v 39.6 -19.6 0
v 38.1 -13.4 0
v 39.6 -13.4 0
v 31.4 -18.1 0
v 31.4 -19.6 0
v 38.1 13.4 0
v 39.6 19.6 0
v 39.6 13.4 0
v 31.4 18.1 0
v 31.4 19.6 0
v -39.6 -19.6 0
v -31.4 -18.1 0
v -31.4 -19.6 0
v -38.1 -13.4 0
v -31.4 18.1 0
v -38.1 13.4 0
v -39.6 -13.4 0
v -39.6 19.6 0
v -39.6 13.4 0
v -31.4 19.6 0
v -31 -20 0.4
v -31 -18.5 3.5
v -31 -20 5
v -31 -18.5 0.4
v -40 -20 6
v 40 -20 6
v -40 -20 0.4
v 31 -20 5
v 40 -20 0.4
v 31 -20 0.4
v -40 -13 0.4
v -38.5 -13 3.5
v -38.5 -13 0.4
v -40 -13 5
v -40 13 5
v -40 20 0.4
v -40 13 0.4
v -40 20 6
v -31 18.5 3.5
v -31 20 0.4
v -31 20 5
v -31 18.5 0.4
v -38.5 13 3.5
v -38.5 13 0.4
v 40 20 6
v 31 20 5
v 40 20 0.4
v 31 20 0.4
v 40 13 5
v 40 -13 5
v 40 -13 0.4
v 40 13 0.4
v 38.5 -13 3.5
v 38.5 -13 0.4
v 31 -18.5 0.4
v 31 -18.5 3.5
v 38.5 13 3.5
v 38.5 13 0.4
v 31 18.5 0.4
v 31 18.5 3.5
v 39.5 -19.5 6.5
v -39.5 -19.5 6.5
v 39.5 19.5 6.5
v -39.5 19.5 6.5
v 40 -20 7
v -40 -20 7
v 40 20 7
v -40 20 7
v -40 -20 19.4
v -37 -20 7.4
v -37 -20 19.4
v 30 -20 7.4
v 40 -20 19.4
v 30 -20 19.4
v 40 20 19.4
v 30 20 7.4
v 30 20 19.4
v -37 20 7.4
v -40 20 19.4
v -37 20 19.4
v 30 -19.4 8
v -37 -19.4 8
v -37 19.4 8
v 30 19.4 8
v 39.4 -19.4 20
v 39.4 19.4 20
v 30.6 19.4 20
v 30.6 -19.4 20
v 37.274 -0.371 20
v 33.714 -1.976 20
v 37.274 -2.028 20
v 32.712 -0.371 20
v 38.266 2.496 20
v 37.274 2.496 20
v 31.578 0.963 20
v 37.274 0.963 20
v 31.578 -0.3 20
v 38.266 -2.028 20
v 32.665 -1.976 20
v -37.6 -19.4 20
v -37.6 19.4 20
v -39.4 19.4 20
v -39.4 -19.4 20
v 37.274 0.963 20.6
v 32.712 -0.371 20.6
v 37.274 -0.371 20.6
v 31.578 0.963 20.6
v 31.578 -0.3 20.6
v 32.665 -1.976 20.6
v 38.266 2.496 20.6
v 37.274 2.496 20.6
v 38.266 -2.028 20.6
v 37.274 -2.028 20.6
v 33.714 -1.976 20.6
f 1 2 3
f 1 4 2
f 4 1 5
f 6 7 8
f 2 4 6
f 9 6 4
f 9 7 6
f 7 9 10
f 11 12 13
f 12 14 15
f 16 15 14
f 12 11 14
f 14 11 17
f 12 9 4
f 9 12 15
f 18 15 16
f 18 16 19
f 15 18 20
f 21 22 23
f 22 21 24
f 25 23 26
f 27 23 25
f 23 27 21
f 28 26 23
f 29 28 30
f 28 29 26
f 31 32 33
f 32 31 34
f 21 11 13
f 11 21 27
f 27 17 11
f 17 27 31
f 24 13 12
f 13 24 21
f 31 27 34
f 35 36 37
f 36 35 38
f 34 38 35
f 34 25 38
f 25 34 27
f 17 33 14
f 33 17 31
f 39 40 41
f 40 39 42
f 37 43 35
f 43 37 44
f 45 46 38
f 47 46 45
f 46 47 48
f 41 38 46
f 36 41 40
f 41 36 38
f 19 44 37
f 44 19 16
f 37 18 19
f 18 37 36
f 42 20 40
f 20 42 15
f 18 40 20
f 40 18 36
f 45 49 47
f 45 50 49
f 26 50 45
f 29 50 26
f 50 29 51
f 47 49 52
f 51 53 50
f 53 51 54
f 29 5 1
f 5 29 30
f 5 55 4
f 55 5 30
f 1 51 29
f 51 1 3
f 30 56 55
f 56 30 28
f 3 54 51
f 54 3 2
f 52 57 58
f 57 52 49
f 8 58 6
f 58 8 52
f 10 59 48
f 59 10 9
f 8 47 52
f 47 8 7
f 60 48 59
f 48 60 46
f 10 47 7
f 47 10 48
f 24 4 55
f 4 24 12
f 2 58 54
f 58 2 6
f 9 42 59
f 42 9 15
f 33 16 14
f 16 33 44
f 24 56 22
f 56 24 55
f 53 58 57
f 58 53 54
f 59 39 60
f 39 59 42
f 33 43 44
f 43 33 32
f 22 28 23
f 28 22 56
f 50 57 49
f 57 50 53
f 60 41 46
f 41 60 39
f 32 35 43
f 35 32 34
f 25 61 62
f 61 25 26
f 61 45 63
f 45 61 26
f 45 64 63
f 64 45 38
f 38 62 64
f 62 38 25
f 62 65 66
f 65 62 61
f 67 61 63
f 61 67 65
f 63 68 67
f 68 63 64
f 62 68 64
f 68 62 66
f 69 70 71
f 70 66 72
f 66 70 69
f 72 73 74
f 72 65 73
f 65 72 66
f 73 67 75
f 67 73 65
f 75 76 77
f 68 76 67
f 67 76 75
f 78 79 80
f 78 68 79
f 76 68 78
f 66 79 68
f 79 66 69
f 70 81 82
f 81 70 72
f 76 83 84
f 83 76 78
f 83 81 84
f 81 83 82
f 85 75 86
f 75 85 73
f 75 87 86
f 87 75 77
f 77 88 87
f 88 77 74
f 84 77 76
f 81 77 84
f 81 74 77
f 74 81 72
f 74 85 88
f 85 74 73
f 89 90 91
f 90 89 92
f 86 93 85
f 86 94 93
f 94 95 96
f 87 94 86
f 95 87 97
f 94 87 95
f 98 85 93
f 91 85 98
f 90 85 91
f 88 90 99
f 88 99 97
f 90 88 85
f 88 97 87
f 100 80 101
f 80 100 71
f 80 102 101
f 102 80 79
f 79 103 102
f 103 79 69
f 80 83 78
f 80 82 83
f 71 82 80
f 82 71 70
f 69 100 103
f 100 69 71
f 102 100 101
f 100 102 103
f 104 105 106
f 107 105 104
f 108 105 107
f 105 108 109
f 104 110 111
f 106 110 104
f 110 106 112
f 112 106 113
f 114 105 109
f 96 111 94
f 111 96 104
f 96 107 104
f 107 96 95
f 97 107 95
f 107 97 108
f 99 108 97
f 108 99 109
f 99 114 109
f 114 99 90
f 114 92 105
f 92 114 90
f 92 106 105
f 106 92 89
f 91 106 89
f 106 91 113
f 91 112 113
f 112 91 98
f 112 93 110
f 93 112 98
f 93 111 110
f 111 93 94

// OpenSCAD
// bed.scad - hospital bed (design_brief.md 4.1). One design for the standard beds 1-20 and the
// isolation beds I-1 to I-6; filament colour and number differ. 80 x 40 x 20.6: mattress top at 8,
// footboard 10 thick (+x end) and headboard 3 thick (-x end) with tops at 20, the number raised
// 0.6 on the footboard top and reading upright from the foot end. Optional 1 mm V-groove around
// the sides at 6.5 (frame/mattress line). Imitated legs: the four corners keep the full outline up
// to 5, and the sides between them are set in 1.5 and flare back out at 45 deg, so nothing sticks
// out past the 80 x 40 footprint and the bed still prints upright without support. Two colours:
// body, then the number; change at Z 20.0.
// An empty bed (bed_label="") carries no number and is a single colour. The black sheet that
// marks it as stripped is a separate part, bed_sheet.scad, laid on the mattress between the
// boards: on a single-extruder printer a sheet moulded into the bed would need a colour change
// in a Z band the boards also occupy, so the boards would come out black there too.
// Prints upright.   Export: openscad -o bed_20.stl -D 'bed_label="20"' bed.scad  (see export_beds.sh)
include <common.scad>

bed_label    = "1";             // "1".."20", "I-1".."I-6", or "" for an empty bed
length       = bed_l;           // 80, from common.scad
width        = bed_w;           // 40
mattress_z   = 8;               // mattress top
board_z      = 20;              // top of the footboard; the number sits on it
head_z       = board_z;         // headboard top: may be lower, never higher
foot_t       = 10;              // footboard thickness
head_t       = 3;               // headboard thickness
groove       = true;            // V-groove around the sides, above the legs
groove_z     = 6.5;
groove_w     = 1;               // opening; 0.5 deep, 45 deg flanks
legs         = true;            // imitated legs at the four corners
leg_l        = 9;               // along the bed
leg_w        = 7;               // across the bed
leg_h        = 5;               // top of the legs, where the set-in sides flare back out
leg_inset    = 1.5;             // how far the sides between the legs are set in
edge_chamfer = 0.6;             // exposed top edges: mattress sides, board tops
label_size   = text_size_bed;   // 7: capitals 6.7, strokes 1.4

// One corner leg: a block on the full outline of the bed, standing on the bed plate up to leg_h,
// where the body above takes over. The sides between the legs are set in by bed_body, so a leg
// reads as a leg without anything sticking out past the footprint. No downward face, no support.
module bed_leg(sx, sy) {
    lx = leg_l / 2; ly = leg_w / 2; cb = chamfer_bottom;
    translate([sx * (length / 2 - leg_l / 2), sy * (width / 2 - leg_w / 2), 0])
        ring_stack([[lx - cb, ly - cb, 0], [lx, ly, cb], [lx, ly, leg_h]]);
}

module bed_body() {
    l = length / 2; w = width / 2; cb = chamfer_bottom; g = groove_w / 2; root = edge_chamfer;
    ins = legs ? leg_inset : 0;
    // block up to the mattress top: sides set in between the legs, then the groove, then a
    // chamfer on the mattress edges
    ring_stack(concat([[l - ins - cb, w - ins - cb, 0], [l - ins, w - ins, cb]],
                      ins > 0 ? [[l - ins, w - ins, leg_h - ins], [l, w, leg_h]] : [],
                      groove ? [[l, w, groove_z - g], [l - g, w - g, groove_z], [l, w, groove_z + g]] : [],
                      [[l, w, mattress_z - root], [l - root, w - root, mattress_z]]));
    // boards, rooted into the block so they fill the mattress-edge chamfer under them
    translate([l - foot_t / 2, 0, mattress_z - root])
        chamfered_box([foot_t, width, board_z - mattress_z + root], cb = 0, ct = edge_chamfer);
    translate([-l + head_t / 2, 0, mattress_z - root])
        chamfered_box([head_t, width, head_z - mattress_z + root], cb = 0, ct = edge_chamfer);
    if (legs) for (sx = [-1, 1], sy = [-1, 1]) bed_leg(sx, sy);
}

// Number on the footboard top: text x runs along +y, text up points to -x (the head end),
// so it reads upright from the foot end.
module bed_number(label) {
    assert(cap_height(label_size) + 1 <= foot_t - 2 * edge_chamfer,
           str("number ", label, " is taller than the footboard top is thick"));
    band_at(2, board_z, detail_h) translate([length / 2 - foot_t / 2, 0]) rotate(90)
        label_2d(label, label_size, max_w = width - 2 * edge_chamfer - 2 * text_margin);
}

module bed(label = bed_label) {
    band_colour(1) bed_body();
    if (len(label) > 0) bed_number(label);
}

bed();
